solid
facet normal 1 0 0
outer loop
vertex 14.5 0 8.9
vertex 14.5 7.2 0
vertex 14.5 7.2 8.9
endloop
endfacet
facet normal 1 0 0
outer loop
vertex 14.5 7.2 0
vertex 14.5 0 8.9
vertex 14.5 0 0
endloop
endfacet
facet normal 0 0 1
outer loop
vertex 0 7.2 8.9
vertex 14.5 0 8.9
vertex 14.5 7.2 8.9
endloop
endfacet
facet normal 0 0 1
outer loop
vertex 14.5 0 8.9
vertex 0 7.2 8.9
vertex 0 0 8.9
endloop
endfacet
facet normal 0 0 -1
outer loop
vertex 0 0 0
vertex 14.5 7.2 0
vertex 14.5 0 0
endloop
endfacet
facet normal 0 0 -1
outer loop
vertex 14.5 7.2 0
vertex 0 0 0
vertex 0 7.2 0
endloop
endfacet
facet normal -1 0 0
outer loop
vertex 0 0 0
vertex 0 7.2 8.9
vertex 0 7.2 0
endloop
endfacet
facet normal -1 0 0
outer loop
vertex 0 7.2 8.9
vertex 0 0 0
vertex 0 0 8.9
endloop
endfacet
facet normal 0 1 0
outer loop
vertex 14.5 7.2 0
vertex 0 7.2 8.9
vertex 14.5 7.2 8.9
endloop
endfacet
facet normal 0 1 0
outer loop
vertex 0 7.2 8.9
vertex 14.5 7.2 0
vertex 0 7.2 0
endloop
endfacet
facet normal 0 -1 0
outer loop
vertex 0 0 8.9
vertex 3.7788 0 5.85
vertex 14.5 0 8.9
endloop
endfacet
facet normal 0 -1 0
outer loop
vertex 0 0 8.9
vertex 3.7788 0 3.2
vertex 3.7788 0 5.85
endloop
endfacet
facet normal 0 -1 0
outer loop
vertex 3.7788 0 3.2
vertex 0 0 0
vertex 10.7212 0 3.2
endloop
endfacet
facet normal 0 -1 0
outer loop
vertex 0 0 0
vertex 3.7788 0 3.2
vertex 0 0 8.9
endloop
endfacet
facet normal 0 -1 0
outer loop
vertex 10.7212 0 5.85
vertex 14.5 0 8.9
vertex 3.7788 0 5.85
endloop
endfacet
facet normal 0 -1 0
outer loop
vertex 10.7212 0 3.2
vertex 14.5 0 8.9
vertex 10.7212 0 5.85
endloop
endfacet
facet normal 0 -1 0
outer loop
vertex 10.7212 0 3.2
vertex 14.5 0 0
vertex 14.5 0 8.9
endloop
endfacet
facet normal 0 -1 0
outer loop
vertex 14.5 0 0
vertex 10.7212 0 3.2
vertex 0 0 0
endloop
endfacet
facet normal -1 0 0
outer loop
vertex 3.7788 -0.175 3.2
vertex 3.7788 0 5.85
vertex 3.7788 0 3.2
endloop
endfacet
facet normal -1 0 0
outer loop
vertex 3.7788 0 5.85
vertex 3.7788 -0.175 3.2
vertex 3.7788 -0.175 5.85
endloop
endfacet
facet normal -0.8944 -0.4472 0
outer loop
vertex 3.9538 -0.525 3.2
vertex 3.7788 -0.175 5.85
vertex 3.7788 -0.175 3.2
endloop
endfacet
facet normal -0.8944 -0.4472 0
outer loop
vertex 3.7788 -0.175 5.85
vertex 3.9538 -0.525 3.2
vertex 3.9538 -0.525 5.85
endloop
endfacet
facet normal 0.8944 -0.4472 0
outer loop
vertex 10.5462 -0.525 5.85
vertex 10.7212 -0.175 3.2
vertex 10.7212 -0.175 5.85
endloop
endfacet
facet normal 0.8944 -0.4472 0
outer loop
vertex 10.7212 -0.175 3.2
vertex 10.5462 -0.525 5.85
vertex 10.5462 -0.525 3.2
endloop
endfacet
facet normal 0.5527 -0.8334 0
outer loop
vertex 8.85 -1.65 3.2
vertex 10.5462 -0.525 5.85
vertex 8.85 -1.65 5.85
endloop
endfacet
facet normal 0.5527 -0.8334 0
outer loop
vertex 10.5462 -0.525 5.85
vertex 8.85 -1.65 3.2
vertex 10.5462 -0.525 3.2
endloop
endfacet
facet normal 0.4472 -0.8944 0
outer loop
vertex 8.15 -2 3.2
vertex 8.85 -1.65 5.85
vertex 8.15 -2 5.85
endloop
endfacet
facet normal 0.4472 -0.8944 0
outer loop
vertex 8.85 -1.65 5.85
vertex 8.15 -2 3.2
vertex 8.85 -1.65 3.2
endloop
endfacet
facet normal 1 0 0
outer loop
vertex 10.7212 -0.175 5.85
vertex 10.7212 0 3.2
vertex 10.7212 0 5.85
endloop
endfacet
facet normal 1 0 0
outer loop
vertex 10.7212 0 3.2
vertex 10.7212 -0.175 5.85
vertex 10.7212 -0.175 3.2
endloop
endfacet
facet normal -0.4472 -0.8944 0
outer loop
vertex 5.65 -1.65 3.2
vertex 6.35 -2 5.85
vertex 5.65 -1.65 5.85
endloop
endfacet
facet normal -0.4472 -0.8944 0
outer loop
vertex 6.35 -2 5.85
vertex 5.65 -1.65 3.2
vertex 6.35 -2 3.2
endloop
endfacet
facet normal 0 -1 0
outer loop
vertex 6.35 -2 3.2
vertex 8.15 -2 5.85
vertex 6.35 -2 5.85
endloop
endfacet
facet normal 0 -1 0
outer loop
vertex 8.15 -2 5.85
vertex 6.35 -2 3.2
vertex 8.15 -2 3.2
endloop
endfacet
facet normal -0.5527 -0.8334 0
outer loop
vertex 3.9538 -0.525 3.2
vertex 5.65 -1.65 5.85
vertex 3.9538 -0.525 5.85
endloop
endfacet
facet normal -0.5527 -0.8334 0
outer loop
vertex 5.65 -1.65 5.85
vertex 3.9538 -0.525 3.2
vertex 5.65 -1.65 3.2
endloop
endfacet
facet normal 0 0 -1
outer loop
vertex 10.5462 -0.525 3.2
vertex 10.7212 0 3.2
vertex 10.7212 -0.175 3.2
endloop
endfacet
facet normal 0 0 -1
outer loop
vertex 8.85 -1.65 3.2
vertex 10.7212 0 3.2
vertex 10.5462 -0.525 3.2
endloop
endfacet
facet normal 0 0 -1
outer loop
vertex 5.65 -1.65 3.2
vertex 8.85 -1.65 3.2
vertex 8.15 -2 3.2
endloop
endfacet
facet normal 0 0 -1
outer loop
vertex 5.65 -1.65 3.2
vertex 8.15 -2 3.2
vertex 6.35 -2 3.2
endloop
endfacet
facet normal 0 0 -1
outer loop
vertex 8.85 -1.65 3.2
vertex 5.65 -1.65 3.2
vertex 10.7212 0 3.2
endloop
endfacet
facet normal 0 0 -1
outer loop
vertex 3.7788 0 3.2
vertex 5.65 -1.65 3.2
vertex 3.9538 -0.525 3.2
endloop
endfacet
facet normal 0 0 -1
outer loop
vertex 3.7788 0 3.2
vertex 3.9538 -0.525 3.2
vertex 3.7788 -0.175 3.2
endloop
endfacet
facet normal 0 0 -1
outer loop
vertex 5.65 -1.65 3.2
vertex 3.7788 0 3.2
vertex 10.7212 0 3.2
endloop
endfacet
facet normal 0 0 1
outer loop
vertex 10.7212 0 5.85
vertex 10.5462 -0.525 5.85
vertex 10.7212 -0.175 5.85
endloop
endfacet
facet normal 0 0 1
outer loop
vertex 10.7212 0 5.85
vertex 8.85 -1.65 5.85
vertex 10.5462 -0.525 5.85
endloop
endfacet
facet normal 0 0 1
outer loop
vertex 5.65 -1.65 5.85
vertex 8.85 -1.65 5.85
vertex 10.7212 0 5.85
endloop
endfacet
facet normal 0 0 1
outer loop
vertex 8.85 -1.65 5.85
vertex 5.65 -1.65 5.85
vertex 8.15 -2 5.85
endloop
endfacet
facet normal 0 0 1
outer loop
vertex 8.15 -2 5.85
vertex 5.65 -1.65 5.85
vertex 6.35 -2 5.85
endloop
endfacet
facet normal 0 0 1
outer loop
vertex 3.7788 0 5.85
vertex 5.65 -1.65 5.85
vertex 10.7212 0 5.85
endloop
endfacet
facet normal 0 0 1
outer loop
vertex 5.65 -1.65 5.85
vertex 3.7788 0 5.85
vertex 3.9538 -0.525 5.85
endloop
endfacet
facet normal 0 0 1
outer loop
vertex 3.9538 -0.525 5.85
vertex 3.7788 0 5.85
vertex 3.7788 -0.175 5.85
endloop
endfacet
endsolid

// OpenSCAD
// file: Parts/ZipTiePoint.scad
// created by IndiePandaaaaa | Lukas

function ziptie_point_height(ziptie_depth = 2) = ((ziptie_depth / tan(42)) * 2) + (ziptie_depth * 1.25);

module ziptiepoint(width = 2.5, depth = 2, cutout = false) {
  module cutout_sample(width, depth) {
    chamfer = 0.35;
    io_height = (depth) / tan(42);
    middle_height = depth * 1.25;

    // cutout for ziptie
    translate([0, -(2 * io_height + middle_height) / 2, -width / 2])
      linear_extrude(width + 0.15) {
        polygon([
            [0, 0],
            [chamfer - chamfer / 2, 0],
            [chamfer + chamfer / 2, chamfer / 2],
            [depth - chamfer, io_height - chamfer],
            [depth, io_height + chamfer],
            [depth, io_height + middle_height - chamfer],
            [depth - chamfer, io_height + middle_height + chamfer],
            [chamfer + chamfer / 2, 2 * io_height + middle_height - chamfer / 2],
            [chamfer - chamfer / 2, 2 * io_height + middle_height],
            [0, 2 * io_height + middle_height],
          ]);
      }
  }

  if (cutout) {
    cutout_sample(width, depth);
  } else {
    rotate([90, 0, 180])
      cutout_sample(width, depth);
  }
}

ziptiepoint(cutout = true);
// main file
use <Parts/ZipTiePoint.scad>

height = 8.9;
width = 14.5;
depth = 7.2;

union() {
  difference() {
    cube([width, depth, height]);
    translate([width / 2, 0, height / 2])
      rotate([90, 0, 90])
        ziptiepoint(cutout_sample = true);
  }
  translate([width / 2, 0, height / 2])
    rotate([90, 0, 90])
      ziptiepoint(cutout_sample = false);
}
